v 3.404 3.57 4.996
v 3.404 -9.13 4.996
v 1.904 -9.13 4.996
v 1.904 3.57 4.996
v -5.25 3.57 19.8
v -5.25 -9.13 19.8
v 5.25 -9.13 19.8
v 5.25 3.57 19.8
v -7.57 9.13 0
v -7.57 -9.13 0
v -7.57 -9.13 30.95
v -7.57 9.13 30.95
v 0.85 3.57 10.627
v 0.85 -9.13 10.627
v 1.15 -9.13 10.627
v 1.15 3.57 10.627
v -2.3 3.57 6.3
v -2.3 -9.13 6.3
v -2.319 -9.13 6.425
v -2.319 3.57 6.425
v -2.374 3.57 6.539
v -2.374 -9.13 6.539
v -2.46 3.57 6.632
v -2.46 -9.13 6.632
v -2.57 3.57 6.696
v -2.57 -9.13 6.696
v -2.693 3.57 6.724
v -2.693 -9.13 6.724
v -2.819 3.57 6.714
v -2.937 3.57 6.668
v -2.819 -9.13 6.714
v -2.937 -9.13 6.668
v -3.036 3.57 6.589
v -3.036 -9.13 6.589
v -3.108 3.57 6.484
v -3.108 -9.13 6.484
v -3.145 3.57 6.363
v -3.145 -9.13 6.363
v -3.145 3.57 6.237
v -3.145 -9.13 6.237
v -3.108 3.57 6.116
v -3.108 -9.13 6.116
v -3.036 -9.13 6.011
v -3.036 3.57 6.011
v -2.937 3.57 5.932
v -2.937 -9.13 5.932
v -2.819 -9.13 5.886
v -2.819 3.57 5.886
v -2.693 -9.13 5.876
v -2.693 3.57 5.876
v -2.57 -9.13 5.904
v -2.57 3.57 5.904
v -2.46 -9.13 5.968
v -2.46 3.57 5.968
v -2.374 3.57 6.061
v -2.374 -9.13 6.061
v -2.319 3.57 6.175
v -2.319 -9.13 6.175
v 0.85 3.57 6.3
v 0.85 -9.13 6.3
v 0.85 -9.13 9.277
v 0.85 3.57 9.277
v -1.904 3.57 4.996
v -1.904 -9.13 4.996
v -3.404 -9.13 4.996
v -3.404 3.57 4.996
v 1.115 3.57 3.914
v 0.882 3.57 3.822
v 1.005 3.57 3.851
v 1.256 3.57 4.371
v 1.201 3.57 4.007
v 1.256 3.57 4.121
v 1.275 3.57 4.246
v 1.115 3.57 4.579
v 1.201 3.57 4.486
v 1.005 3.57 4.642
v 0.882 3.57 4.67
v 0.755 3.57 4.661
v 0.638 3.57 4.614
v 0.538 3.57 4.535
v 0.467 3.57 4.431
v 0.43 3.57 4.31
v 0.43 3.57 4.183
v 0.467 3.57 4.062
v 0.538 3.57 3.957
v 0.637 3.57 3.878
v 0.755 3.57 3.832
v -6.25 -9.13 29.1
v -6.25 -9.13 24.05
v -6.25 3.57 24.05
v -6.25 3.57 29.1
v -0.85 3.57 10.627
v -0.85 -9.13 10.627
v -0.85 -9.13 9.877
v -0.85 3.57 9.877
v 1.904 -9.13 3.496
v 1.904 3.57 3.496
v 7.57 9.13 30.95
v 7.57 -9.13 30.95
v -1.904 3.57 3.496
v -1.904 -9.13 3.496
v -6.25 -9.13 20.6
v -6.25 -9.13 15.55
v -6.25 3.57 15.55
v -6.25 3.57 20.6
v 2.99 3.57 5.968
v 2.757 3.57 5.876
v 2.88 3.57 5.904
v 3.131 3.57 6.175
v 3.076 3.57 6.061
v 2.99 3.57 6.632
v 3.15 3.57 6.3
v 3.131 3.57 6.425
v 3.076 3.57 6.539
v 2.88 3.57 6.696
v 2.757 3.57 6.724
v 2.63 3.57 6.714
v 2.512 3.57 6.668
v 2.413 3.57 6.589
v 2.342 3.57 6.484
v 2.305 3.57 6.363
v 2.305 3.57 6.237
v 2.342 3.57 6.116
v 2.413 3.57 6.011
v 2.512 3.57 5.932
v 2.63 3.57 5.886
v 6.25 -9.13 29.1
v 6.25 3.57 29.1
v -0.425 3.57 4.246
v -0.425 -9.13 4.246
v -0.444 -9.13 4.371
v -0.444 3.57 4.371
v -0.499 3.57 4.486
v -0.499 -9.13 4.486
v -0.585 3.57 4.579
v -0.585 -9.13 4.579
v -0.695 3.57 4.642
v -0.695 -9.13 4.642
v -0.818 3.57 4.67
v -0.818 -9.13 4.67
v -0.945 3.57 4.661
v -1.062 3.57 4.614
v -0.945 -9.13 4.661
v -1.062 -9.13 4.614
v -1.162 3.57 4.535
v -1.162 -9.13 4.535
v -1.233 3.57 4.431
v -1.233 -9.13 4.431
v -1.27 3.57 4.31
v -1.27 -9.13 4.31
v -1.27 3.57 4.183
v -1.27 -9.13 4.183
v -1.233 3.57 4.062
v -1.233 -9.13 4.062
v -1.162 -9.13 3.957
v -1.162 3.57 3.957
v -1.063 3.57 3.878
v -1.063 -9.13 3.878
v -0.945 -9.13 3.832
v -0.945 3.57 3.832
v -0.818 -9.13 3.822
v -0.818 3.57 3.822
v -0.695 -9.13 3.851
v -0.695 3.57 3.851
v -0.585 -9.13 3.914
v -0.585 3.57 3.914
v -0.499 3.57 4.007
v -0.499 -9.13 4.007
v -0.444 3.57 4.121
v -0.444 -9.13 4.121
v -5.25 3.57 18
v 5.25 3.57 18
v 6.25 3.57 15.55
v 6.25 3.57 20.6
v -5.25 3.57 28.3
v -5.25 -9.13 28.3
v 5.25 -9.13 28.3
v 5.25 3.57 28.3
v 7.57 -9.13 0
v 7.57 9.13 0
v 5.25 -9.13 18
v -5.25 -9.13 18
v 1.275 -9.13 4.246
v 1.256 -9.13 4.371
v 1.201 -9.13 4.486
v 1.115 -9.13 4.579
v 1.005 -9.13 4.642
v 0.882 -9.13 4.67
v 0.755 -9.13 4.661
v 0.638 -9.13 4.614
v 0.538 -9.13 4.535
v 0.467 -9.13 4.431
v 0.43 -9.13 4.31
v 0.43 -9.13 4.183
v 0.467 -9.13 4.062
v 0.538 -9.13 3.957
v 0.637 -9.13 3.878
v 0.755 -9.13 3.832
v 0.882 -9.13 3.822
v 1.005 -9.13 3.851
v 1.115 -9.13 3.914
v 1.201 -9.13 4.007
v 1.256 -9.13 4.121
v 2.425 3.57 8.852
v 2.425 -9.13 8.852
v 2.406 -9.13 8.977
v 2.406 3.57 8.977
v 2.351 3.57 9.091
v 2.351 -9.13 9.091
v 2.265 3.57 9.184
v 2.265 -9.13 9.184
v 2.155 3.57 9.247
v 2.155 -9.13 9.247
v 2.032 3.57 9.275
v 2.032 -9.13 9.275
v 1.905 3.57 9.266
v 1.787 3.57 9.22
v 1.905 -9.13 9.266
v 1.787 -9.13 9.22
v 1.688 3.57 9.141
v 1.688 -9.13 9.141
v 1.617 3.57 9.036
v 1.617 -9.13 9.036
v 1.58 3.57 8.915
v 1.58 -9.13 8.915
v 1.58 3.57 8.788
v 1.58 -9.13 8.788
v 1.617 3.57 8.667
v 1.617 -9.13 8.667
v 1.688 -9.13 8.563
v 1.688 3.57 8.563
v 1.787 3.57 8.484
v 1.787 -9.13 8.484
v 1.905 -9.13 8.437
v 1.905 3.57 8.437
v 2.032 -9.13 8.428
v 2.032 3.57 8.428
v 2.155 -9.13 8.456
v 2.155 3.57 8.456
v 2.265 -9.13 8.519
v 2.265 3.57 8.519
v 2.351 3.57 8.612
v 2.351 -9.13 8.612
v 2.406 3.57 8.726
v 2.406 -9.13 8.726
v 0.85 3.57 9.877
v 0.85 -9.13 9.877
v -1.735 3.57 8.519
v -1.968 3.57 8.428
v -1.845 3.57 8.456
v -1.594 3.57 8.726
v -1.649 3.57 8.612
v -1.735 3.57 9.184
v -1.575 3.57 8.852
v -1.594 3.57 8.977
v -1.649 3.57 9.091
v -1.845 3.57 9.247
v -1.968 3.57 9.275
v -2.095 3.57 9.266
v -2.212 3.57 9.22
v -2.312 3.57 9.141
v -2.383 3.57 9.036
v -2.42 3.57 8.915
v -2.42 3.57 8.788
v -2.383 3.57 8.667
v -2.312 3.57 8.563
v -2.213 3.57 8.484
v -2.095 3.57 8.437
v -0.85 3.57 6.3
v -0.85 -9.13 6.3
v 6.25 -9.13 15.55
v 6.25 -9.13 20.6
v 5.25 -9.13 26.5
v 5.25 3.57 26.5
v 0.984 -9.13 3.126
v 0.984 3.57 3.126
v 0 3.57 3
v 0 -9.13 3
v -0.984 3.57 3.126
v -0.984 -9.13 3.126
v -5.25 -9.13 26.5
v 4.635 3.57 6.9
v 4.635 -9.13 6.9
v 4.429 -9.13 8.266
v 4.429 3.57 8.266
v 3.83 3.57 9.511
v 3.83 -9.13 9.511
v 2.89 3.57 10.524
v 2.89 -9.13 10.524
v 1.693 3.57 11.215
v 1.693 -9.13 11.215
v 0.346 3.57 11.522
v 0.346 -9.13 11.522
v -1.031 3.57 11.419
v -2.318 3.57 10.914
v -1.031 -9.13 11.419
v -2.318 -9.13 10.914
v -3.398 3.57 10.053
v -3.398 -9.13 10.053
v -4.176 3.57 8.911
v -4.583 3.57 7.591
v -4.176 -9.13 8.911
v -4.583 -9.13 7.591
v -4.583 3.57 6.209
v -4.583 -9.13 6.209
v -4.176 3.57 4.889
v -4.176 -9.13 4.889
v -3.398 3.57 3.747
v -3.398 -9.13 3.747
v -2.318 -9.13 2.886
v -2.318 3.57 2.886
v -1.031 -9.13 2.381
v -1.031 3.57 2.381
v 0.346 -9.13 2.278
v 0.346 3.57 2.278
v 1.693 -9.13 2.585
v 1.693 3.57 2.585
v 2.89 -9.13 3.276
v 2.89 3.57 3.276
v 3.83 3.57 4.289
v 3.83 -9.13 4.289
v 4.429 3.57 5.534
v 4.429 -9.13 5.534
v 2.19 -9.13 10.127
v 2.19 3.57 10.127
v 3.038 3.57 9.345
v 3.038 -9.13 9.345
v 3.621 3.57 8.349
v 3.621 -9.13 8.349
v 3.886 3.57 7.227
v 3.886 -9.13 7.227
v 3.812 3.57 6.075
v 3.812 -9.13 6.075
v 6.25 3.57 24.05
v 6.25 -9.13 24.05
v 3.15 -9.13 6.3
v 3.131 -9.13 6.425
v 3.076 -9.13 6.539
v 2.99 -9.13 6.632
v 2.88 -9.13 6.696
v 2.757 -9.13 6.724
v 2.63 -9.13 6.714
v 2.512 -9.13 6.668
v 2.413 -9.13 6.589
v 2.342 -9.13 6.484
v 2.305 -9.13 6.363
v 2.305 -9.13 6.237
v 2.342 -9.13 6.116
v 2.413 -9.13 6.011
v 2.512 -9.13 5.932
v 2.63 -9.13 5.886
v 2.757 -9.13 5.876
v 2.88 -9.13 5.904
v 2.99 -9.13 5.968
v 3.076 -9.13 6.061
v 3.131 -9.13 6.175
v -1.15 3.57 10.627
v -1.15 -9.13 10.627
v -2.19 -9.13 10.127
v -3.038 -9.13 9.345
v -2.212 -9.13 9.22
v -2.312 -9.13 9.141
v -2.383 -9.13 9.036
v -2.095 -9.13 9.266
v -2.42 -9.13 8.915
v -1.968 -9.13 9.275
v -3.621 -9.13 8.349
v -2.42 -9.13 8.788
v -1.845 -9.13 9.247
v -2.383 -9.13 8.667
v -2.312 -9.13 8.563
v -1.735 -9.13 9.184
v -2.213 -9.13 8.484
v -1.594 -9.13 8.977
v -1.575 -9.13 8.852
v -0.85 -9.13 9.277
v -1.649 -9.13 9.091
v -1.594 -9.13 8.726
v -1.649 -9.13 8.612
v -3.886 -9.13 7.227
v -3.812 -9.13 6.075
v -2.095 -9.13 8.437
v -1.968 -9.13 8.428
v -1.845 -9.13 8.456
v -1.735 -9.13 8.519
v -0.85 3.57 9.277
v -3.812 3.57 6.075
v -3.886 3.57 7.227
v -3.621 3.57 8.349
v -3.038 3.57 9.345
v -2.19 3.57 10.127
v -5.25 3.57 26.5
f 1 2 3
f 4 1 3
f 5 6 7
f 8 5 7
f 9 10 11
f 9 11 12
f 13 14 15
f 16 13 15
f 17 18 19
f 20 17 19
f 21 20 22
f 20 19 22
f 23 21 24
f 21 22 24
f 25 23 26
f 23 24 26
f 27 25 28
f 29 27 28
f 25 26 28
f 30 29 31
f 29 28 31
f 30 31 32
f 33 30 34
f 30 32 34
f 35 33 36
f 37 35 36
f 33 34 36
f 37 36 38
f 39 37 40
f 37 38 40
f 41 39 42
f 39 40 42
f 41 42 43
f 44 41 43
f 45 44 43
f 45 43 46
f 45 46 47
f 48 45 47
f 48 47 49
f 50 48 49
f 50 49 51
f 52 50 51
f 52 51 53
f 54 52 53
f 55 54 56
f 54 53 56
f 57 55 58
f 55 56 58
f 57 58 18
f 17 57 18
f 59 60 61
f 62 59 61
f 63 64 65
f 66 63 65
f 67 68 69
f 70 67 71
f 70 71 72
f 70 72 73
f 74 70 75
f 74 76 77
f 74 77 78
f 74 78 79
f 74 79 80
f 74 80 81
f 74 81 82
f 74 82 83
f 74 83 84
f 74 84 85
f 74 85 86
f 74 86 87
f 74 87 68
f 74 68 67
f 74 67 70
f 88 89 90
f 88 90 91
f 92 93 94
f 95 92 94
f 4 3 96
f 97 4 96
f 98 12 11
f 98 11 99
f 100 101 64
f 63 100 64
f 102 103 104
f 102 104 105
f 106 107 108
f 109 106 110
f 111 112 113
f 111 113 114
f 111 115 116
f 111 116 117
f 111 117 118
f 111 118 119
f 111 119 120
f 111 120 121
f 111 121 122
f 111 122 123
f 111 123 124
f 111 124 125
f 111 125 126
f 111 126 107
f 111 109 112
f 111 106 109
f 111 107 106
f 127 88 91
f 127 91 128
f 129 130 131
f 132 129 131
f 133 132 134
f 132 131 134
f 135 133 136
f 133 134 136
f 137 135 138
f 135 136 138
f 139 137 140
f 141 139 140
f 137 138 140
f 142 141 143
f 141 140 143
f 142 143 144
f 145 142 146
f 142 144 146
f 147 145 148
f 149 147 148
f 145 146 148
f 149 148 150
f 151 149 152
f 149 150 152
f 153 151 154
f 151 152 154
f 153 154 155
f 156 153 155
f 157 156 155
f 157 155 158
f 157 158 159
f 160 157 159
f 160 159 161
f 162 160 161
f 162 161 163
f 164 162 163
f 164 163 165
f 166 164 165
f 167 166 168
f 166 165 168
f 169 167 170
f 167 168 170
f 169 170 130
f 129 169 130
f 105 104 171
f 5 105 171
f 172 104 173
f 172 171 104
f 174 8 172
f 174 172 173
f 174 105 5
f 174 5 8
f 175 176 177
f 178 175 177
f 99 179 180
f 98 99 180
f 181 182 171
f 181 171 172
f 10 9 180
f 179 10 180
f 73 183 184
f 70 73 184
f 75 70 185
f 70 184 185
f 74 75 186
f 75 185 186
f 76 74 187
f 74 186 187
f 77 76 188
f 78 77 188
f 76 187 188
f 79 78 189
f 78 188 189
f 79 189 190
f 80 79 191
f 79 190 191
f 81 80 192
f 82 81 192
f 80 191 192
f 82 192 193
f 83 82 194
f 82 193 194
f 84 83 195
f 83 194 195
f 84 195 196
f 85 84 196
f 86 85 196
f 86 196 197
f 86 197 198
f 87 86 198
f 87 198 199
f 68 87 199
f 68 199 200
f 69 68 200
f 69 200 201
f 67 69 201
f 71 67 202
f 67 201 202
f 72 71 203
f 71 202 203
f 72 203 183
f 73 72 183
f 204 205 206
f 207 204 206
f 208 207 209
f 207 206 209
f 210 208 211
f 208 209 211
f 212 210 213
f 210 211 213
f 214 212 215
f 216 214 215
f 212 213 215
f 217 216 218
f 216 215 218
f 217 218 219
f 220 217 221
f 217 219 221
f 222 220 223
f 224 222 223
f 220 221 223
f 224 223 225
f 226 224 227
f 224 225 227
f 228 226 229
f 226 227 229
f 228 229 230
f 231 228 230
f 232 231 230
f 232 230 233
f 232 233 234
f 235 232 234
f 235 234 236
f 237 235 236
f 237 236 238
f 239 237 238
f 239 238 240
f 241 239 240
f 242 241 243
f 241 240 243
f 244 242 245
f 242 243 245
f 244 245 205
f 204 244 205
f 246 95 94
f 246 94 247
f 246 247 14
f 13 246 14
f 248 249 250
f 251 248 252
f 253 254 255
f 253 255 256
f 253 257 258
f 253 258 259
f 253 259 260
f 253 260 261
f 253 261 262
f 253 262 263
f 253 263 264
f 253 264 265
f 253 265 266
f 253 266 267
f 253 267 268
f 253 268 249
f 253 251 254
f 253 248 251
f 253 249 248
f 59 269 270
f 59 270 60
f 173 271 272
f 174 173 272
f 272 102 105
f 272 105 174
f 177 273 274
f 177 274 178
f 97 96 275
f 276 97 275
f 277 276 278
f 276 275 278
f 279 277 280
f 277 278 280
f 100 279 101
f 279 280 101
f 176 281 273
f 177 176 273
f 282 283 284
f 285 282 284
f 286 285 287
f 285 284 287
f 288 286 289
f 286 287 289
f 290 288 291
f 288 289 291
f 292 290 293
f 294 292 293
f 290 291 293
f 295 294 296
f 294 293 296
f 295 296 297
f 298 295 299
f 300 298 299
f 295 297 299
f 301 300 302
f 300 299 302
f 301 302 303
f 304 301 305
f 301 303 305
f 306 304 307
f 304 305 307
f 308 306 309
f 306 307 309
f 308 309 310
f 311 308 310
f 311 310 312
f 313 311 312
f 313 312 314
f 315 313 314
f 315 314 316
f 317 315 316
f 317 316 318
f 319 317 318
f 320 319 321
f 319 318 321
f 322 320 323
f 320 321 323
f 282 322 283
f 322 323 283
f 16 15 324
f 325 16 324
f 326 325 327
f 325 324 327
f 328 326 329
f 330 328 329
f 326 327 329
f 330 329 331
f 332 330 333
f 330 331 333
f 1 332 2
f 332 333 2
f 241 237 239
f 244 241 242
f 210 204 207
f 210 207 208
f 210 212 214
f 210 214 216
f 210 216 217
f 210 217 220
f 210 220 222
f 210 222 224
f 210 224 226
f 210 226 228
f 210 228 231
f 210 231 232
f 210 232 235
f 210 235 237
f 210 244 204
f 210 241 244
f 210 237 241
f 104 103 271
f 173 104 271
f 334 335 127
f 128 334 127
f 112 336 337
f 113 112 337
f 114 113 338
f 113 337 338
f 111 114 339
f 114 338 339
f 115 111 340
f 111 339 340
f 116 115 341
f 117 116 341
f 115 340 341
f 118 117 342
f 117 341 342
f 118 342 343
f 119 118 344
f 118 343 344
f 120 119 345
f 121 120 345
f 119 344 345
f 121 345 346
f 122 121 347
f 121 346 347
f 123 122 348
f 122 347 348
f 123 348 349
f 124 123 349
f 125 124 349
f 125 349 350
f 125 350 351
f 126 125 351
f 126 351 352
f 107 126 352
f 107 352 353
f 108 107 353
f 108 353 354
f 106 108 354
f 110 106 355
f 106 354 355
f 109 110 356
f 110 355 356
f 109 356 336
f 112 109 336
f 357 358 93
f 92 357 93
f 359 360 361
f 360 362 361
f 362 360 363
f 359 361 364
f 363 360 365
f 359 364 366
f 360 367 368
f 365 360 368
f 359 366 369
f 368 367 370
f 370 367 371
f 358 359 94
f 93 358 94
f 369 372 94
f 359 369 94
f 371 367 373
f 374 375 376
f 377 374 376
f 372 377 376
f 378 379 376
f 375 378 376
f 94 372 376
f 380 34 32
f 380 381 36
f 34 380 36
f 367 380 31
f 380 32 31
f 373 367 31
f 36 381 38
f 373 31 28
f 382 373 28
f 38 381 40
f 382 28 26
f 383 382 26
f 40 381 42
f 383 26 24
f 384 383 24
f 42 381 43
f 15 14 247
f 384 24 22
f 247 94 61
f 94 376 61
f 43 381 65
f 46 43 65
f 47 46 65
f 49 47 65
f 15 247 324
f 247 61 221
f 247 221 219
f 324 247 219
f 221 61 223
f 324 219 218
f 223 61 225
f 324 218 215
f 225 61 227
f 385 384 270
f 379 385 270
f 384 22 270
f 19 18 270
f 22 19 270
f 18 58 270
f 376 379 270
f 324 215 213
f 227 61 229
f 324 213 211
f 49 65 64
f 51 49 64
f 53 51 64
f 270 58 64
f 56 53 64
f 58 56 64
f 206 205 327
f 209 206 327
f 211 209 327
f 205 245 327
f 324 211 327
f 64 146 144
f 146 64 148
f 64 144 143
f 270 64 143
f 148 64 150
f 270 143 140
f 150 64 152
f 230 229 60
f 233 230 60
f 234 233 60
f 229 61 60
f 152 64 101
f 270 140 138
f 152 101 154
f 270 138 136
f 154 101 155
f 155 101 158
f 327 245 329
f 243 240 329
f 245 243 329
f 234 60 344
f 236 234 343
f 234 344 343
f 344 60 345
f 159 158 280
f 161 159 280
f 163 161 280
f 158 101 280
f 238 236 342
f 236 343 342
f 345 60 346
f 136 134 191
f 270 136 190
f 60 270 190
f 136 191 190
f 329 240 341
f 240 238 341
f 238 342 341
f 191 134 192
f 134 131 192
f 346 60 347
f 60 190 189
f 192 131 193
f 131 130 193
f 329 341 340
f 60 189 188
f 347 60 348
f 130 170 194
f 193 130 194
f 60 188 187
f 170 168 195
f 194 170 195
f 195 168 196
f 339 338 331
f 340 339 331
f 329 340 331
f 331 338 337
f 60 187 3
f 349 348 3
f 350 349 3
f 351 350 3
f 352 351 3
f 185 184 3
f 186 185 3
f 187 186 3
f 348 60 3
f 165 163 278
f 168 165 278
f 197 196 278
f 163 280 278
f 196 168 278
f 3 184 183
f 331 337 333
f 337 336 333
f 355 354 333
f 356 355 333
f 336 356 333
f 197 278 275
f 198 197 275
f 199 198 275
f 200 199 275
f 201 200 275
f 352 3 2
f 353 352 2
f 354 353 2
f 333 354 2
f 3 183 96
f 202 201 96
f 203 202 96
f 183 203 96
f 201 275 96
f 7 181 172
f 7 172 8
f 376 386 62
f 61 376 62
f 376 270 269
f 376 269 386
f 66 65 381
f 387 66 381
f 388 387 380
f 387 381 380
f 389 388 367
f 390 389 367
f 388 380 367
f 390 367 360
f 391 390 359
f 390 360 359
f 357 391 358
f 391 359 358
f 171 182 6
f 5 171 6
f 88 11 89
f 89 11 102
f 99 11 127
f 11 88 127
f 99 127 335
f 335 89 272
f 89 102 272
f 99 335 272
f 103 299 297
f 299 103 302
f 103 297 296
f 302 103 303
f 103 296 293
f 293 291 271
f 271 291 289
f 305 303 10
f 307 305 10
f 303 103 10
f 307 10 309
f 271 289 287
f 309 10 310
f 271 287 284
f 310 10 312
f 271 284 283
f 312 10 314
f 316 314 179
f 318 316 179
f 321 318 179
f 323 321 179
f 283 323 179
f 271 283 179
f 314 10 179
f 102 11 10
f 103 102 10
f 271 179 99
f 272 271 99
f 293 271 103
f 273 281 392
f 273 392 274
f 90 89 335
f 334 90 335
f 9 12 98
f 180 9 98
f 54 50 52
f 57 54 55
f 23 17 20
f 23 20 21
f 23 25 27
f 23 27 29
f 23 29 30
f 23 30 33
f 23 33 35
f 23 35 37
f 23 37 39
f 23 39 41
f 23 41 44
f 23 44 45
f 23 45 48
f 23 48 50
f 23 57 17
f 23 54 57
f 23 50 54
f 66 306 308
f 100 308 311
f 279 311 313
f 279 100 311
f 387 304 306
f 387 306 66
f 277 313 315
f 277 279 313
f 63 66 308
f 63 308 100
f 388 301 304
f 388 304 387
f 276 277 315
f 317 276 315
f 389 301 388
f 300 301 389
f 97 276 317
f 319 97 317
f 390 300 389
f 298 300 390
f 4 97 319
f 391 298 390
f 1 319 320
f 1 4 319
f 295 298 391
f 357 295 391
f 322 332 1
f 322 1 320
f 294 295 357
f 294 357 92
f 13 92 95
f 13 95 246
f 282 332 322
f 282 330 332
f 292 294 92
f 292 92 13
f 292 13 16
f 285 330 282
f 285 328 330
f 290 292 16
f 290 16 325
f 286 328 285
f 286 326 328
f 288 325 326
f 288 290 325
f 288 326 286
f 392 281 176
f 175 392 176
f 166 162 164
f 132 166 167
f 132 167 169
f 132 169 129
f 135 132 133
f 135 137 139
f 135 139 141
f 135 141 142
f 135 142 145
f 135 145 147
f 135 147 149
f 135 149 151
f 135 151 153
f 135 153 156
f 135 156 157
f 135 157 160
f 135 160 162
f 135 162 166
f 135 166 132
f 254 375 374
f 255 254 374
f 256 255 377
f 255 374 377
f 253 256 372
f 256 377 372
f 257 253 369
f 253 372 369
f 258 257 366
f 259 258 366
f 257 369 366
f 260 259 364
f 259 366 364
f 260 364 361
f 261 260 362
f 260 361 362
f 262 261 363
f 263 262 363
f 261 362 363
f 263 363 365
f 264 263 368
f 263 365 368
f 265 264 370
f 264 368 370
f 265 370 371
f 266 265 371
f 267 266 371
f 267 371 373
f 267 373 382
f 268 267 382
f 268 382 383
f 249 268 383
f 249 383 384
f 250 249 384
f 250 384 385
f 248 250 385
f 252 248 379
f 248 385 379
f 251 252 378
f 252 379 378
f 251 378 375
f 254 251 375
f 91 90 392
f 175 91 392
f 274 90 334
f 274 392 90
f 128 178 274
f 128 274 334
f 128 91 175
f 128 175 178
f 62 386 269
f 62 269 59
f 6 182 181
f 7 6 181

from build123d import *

# Parameters (mm, degrees)
F0_W     = 15.14
F0_H     = 18.26
F3_DEPTH = 30.95
F1_W     = 12.5
F1_H     = 5.05
F1_W_2   = 10.5
F1_H_2   = 1.8
F1_R     = 4.635
F4_DEPTH = 12.7
F1_R_2   = 0.425
F1_W_3   = 1.7
F1_H_3   = 2.976594
F2_DEPTH = 12.7


with BuildPart() as f3:
    # F0 (on Top) → F3 (new body)
    with BuildSketch(Plane.XY):
        Rectangle(F0_W, F0_H)
    extrude(amount=F3_DEPTH)

    # F1 (on face) → F4 (cut)
    with BuildSketch(Plane.XZ.offset(9.13)):
        with Locations((0, 26.575)):
            Rectangle(F1_W, F1_H)
        with Locations((0, 27.4)):
            Rectangle(F1_W_2, F1_H_2, mode=Mode.SUBTRACT)
        with Locations((0, 18.075)):
            Rectangle(F1_W, F1_H)
        with Locations((0, 18.9)):
            Rectangle(F1_W_2, F1_H_2, mode=Mode.SUBTRACT)
        with Locations((0, 6.9)):
            Circle(F1_R)
        with BuildLine():
            ThreePointArc((-3.403771, 4.996229), (-3.620699, 8.349324), (-1.15, 10.626594))
            Line((-1.15, 10.626594), (-0.85, 10.626594))
            Line((-0.85, 10.626594), (-0.85, 9.876594))
            Line((-0.85, 9.876594), (0.85, 9.876594))
            Line((0.85, 9.876594), (0.85, 10.626594))
            Line((0.85, 10.626594), (1.15, 10.626594))
            ThreePointArc((1.15, 10.626594), (3.620699, 8.349324), (3.403771, 4.996229))
            Line((3.403771, 4.996229), (1.903771, 4.996229))
            Line((1.903771, 4.996229), (1.903771, 3.496229))
            ThreePointArc((1.903771, 3.496229), (0, 3), (-1.903771, 3.496229))
            Line((-1.903771, 3.496229), (-1.903771, 4.996229))
            Line((-1.903771, 4.996229), (-3.403771, 4.996229))
        make_face(mode=Mode.SUBTRACT)
    extrude(amount=-F4_DEPTH, mode=Mode.SUBTRACT)

    # F1 (on face) → F2 (cut)
    with BuildSketch(Plane.XZ.offset(9.13)):
        with Locations((-2, 8.851594)):
            Circle(F1_R_2)
        with Locations((-2.724793, 6.3)):
            Circle(F1_R_2)
        with Locations((-0.85, 4.246229)):
            Circle(F1_R_2)
        with Locations((2.724793, 6.3)):
            Circle(F1_R_2)
        with Locations((2, 8.851594)):
            Circle(F1_R_2)
        with Locations((0.85, 4.246229)):
            Circle(F1_R_2)
        with Locations((0, 7.788297)):
            Rectangle(F1_W_3, F1_H_3)
    extrude(amount=-F2_DEPTH, mode=Mode.SUBTRACT)


solid = f3.part
